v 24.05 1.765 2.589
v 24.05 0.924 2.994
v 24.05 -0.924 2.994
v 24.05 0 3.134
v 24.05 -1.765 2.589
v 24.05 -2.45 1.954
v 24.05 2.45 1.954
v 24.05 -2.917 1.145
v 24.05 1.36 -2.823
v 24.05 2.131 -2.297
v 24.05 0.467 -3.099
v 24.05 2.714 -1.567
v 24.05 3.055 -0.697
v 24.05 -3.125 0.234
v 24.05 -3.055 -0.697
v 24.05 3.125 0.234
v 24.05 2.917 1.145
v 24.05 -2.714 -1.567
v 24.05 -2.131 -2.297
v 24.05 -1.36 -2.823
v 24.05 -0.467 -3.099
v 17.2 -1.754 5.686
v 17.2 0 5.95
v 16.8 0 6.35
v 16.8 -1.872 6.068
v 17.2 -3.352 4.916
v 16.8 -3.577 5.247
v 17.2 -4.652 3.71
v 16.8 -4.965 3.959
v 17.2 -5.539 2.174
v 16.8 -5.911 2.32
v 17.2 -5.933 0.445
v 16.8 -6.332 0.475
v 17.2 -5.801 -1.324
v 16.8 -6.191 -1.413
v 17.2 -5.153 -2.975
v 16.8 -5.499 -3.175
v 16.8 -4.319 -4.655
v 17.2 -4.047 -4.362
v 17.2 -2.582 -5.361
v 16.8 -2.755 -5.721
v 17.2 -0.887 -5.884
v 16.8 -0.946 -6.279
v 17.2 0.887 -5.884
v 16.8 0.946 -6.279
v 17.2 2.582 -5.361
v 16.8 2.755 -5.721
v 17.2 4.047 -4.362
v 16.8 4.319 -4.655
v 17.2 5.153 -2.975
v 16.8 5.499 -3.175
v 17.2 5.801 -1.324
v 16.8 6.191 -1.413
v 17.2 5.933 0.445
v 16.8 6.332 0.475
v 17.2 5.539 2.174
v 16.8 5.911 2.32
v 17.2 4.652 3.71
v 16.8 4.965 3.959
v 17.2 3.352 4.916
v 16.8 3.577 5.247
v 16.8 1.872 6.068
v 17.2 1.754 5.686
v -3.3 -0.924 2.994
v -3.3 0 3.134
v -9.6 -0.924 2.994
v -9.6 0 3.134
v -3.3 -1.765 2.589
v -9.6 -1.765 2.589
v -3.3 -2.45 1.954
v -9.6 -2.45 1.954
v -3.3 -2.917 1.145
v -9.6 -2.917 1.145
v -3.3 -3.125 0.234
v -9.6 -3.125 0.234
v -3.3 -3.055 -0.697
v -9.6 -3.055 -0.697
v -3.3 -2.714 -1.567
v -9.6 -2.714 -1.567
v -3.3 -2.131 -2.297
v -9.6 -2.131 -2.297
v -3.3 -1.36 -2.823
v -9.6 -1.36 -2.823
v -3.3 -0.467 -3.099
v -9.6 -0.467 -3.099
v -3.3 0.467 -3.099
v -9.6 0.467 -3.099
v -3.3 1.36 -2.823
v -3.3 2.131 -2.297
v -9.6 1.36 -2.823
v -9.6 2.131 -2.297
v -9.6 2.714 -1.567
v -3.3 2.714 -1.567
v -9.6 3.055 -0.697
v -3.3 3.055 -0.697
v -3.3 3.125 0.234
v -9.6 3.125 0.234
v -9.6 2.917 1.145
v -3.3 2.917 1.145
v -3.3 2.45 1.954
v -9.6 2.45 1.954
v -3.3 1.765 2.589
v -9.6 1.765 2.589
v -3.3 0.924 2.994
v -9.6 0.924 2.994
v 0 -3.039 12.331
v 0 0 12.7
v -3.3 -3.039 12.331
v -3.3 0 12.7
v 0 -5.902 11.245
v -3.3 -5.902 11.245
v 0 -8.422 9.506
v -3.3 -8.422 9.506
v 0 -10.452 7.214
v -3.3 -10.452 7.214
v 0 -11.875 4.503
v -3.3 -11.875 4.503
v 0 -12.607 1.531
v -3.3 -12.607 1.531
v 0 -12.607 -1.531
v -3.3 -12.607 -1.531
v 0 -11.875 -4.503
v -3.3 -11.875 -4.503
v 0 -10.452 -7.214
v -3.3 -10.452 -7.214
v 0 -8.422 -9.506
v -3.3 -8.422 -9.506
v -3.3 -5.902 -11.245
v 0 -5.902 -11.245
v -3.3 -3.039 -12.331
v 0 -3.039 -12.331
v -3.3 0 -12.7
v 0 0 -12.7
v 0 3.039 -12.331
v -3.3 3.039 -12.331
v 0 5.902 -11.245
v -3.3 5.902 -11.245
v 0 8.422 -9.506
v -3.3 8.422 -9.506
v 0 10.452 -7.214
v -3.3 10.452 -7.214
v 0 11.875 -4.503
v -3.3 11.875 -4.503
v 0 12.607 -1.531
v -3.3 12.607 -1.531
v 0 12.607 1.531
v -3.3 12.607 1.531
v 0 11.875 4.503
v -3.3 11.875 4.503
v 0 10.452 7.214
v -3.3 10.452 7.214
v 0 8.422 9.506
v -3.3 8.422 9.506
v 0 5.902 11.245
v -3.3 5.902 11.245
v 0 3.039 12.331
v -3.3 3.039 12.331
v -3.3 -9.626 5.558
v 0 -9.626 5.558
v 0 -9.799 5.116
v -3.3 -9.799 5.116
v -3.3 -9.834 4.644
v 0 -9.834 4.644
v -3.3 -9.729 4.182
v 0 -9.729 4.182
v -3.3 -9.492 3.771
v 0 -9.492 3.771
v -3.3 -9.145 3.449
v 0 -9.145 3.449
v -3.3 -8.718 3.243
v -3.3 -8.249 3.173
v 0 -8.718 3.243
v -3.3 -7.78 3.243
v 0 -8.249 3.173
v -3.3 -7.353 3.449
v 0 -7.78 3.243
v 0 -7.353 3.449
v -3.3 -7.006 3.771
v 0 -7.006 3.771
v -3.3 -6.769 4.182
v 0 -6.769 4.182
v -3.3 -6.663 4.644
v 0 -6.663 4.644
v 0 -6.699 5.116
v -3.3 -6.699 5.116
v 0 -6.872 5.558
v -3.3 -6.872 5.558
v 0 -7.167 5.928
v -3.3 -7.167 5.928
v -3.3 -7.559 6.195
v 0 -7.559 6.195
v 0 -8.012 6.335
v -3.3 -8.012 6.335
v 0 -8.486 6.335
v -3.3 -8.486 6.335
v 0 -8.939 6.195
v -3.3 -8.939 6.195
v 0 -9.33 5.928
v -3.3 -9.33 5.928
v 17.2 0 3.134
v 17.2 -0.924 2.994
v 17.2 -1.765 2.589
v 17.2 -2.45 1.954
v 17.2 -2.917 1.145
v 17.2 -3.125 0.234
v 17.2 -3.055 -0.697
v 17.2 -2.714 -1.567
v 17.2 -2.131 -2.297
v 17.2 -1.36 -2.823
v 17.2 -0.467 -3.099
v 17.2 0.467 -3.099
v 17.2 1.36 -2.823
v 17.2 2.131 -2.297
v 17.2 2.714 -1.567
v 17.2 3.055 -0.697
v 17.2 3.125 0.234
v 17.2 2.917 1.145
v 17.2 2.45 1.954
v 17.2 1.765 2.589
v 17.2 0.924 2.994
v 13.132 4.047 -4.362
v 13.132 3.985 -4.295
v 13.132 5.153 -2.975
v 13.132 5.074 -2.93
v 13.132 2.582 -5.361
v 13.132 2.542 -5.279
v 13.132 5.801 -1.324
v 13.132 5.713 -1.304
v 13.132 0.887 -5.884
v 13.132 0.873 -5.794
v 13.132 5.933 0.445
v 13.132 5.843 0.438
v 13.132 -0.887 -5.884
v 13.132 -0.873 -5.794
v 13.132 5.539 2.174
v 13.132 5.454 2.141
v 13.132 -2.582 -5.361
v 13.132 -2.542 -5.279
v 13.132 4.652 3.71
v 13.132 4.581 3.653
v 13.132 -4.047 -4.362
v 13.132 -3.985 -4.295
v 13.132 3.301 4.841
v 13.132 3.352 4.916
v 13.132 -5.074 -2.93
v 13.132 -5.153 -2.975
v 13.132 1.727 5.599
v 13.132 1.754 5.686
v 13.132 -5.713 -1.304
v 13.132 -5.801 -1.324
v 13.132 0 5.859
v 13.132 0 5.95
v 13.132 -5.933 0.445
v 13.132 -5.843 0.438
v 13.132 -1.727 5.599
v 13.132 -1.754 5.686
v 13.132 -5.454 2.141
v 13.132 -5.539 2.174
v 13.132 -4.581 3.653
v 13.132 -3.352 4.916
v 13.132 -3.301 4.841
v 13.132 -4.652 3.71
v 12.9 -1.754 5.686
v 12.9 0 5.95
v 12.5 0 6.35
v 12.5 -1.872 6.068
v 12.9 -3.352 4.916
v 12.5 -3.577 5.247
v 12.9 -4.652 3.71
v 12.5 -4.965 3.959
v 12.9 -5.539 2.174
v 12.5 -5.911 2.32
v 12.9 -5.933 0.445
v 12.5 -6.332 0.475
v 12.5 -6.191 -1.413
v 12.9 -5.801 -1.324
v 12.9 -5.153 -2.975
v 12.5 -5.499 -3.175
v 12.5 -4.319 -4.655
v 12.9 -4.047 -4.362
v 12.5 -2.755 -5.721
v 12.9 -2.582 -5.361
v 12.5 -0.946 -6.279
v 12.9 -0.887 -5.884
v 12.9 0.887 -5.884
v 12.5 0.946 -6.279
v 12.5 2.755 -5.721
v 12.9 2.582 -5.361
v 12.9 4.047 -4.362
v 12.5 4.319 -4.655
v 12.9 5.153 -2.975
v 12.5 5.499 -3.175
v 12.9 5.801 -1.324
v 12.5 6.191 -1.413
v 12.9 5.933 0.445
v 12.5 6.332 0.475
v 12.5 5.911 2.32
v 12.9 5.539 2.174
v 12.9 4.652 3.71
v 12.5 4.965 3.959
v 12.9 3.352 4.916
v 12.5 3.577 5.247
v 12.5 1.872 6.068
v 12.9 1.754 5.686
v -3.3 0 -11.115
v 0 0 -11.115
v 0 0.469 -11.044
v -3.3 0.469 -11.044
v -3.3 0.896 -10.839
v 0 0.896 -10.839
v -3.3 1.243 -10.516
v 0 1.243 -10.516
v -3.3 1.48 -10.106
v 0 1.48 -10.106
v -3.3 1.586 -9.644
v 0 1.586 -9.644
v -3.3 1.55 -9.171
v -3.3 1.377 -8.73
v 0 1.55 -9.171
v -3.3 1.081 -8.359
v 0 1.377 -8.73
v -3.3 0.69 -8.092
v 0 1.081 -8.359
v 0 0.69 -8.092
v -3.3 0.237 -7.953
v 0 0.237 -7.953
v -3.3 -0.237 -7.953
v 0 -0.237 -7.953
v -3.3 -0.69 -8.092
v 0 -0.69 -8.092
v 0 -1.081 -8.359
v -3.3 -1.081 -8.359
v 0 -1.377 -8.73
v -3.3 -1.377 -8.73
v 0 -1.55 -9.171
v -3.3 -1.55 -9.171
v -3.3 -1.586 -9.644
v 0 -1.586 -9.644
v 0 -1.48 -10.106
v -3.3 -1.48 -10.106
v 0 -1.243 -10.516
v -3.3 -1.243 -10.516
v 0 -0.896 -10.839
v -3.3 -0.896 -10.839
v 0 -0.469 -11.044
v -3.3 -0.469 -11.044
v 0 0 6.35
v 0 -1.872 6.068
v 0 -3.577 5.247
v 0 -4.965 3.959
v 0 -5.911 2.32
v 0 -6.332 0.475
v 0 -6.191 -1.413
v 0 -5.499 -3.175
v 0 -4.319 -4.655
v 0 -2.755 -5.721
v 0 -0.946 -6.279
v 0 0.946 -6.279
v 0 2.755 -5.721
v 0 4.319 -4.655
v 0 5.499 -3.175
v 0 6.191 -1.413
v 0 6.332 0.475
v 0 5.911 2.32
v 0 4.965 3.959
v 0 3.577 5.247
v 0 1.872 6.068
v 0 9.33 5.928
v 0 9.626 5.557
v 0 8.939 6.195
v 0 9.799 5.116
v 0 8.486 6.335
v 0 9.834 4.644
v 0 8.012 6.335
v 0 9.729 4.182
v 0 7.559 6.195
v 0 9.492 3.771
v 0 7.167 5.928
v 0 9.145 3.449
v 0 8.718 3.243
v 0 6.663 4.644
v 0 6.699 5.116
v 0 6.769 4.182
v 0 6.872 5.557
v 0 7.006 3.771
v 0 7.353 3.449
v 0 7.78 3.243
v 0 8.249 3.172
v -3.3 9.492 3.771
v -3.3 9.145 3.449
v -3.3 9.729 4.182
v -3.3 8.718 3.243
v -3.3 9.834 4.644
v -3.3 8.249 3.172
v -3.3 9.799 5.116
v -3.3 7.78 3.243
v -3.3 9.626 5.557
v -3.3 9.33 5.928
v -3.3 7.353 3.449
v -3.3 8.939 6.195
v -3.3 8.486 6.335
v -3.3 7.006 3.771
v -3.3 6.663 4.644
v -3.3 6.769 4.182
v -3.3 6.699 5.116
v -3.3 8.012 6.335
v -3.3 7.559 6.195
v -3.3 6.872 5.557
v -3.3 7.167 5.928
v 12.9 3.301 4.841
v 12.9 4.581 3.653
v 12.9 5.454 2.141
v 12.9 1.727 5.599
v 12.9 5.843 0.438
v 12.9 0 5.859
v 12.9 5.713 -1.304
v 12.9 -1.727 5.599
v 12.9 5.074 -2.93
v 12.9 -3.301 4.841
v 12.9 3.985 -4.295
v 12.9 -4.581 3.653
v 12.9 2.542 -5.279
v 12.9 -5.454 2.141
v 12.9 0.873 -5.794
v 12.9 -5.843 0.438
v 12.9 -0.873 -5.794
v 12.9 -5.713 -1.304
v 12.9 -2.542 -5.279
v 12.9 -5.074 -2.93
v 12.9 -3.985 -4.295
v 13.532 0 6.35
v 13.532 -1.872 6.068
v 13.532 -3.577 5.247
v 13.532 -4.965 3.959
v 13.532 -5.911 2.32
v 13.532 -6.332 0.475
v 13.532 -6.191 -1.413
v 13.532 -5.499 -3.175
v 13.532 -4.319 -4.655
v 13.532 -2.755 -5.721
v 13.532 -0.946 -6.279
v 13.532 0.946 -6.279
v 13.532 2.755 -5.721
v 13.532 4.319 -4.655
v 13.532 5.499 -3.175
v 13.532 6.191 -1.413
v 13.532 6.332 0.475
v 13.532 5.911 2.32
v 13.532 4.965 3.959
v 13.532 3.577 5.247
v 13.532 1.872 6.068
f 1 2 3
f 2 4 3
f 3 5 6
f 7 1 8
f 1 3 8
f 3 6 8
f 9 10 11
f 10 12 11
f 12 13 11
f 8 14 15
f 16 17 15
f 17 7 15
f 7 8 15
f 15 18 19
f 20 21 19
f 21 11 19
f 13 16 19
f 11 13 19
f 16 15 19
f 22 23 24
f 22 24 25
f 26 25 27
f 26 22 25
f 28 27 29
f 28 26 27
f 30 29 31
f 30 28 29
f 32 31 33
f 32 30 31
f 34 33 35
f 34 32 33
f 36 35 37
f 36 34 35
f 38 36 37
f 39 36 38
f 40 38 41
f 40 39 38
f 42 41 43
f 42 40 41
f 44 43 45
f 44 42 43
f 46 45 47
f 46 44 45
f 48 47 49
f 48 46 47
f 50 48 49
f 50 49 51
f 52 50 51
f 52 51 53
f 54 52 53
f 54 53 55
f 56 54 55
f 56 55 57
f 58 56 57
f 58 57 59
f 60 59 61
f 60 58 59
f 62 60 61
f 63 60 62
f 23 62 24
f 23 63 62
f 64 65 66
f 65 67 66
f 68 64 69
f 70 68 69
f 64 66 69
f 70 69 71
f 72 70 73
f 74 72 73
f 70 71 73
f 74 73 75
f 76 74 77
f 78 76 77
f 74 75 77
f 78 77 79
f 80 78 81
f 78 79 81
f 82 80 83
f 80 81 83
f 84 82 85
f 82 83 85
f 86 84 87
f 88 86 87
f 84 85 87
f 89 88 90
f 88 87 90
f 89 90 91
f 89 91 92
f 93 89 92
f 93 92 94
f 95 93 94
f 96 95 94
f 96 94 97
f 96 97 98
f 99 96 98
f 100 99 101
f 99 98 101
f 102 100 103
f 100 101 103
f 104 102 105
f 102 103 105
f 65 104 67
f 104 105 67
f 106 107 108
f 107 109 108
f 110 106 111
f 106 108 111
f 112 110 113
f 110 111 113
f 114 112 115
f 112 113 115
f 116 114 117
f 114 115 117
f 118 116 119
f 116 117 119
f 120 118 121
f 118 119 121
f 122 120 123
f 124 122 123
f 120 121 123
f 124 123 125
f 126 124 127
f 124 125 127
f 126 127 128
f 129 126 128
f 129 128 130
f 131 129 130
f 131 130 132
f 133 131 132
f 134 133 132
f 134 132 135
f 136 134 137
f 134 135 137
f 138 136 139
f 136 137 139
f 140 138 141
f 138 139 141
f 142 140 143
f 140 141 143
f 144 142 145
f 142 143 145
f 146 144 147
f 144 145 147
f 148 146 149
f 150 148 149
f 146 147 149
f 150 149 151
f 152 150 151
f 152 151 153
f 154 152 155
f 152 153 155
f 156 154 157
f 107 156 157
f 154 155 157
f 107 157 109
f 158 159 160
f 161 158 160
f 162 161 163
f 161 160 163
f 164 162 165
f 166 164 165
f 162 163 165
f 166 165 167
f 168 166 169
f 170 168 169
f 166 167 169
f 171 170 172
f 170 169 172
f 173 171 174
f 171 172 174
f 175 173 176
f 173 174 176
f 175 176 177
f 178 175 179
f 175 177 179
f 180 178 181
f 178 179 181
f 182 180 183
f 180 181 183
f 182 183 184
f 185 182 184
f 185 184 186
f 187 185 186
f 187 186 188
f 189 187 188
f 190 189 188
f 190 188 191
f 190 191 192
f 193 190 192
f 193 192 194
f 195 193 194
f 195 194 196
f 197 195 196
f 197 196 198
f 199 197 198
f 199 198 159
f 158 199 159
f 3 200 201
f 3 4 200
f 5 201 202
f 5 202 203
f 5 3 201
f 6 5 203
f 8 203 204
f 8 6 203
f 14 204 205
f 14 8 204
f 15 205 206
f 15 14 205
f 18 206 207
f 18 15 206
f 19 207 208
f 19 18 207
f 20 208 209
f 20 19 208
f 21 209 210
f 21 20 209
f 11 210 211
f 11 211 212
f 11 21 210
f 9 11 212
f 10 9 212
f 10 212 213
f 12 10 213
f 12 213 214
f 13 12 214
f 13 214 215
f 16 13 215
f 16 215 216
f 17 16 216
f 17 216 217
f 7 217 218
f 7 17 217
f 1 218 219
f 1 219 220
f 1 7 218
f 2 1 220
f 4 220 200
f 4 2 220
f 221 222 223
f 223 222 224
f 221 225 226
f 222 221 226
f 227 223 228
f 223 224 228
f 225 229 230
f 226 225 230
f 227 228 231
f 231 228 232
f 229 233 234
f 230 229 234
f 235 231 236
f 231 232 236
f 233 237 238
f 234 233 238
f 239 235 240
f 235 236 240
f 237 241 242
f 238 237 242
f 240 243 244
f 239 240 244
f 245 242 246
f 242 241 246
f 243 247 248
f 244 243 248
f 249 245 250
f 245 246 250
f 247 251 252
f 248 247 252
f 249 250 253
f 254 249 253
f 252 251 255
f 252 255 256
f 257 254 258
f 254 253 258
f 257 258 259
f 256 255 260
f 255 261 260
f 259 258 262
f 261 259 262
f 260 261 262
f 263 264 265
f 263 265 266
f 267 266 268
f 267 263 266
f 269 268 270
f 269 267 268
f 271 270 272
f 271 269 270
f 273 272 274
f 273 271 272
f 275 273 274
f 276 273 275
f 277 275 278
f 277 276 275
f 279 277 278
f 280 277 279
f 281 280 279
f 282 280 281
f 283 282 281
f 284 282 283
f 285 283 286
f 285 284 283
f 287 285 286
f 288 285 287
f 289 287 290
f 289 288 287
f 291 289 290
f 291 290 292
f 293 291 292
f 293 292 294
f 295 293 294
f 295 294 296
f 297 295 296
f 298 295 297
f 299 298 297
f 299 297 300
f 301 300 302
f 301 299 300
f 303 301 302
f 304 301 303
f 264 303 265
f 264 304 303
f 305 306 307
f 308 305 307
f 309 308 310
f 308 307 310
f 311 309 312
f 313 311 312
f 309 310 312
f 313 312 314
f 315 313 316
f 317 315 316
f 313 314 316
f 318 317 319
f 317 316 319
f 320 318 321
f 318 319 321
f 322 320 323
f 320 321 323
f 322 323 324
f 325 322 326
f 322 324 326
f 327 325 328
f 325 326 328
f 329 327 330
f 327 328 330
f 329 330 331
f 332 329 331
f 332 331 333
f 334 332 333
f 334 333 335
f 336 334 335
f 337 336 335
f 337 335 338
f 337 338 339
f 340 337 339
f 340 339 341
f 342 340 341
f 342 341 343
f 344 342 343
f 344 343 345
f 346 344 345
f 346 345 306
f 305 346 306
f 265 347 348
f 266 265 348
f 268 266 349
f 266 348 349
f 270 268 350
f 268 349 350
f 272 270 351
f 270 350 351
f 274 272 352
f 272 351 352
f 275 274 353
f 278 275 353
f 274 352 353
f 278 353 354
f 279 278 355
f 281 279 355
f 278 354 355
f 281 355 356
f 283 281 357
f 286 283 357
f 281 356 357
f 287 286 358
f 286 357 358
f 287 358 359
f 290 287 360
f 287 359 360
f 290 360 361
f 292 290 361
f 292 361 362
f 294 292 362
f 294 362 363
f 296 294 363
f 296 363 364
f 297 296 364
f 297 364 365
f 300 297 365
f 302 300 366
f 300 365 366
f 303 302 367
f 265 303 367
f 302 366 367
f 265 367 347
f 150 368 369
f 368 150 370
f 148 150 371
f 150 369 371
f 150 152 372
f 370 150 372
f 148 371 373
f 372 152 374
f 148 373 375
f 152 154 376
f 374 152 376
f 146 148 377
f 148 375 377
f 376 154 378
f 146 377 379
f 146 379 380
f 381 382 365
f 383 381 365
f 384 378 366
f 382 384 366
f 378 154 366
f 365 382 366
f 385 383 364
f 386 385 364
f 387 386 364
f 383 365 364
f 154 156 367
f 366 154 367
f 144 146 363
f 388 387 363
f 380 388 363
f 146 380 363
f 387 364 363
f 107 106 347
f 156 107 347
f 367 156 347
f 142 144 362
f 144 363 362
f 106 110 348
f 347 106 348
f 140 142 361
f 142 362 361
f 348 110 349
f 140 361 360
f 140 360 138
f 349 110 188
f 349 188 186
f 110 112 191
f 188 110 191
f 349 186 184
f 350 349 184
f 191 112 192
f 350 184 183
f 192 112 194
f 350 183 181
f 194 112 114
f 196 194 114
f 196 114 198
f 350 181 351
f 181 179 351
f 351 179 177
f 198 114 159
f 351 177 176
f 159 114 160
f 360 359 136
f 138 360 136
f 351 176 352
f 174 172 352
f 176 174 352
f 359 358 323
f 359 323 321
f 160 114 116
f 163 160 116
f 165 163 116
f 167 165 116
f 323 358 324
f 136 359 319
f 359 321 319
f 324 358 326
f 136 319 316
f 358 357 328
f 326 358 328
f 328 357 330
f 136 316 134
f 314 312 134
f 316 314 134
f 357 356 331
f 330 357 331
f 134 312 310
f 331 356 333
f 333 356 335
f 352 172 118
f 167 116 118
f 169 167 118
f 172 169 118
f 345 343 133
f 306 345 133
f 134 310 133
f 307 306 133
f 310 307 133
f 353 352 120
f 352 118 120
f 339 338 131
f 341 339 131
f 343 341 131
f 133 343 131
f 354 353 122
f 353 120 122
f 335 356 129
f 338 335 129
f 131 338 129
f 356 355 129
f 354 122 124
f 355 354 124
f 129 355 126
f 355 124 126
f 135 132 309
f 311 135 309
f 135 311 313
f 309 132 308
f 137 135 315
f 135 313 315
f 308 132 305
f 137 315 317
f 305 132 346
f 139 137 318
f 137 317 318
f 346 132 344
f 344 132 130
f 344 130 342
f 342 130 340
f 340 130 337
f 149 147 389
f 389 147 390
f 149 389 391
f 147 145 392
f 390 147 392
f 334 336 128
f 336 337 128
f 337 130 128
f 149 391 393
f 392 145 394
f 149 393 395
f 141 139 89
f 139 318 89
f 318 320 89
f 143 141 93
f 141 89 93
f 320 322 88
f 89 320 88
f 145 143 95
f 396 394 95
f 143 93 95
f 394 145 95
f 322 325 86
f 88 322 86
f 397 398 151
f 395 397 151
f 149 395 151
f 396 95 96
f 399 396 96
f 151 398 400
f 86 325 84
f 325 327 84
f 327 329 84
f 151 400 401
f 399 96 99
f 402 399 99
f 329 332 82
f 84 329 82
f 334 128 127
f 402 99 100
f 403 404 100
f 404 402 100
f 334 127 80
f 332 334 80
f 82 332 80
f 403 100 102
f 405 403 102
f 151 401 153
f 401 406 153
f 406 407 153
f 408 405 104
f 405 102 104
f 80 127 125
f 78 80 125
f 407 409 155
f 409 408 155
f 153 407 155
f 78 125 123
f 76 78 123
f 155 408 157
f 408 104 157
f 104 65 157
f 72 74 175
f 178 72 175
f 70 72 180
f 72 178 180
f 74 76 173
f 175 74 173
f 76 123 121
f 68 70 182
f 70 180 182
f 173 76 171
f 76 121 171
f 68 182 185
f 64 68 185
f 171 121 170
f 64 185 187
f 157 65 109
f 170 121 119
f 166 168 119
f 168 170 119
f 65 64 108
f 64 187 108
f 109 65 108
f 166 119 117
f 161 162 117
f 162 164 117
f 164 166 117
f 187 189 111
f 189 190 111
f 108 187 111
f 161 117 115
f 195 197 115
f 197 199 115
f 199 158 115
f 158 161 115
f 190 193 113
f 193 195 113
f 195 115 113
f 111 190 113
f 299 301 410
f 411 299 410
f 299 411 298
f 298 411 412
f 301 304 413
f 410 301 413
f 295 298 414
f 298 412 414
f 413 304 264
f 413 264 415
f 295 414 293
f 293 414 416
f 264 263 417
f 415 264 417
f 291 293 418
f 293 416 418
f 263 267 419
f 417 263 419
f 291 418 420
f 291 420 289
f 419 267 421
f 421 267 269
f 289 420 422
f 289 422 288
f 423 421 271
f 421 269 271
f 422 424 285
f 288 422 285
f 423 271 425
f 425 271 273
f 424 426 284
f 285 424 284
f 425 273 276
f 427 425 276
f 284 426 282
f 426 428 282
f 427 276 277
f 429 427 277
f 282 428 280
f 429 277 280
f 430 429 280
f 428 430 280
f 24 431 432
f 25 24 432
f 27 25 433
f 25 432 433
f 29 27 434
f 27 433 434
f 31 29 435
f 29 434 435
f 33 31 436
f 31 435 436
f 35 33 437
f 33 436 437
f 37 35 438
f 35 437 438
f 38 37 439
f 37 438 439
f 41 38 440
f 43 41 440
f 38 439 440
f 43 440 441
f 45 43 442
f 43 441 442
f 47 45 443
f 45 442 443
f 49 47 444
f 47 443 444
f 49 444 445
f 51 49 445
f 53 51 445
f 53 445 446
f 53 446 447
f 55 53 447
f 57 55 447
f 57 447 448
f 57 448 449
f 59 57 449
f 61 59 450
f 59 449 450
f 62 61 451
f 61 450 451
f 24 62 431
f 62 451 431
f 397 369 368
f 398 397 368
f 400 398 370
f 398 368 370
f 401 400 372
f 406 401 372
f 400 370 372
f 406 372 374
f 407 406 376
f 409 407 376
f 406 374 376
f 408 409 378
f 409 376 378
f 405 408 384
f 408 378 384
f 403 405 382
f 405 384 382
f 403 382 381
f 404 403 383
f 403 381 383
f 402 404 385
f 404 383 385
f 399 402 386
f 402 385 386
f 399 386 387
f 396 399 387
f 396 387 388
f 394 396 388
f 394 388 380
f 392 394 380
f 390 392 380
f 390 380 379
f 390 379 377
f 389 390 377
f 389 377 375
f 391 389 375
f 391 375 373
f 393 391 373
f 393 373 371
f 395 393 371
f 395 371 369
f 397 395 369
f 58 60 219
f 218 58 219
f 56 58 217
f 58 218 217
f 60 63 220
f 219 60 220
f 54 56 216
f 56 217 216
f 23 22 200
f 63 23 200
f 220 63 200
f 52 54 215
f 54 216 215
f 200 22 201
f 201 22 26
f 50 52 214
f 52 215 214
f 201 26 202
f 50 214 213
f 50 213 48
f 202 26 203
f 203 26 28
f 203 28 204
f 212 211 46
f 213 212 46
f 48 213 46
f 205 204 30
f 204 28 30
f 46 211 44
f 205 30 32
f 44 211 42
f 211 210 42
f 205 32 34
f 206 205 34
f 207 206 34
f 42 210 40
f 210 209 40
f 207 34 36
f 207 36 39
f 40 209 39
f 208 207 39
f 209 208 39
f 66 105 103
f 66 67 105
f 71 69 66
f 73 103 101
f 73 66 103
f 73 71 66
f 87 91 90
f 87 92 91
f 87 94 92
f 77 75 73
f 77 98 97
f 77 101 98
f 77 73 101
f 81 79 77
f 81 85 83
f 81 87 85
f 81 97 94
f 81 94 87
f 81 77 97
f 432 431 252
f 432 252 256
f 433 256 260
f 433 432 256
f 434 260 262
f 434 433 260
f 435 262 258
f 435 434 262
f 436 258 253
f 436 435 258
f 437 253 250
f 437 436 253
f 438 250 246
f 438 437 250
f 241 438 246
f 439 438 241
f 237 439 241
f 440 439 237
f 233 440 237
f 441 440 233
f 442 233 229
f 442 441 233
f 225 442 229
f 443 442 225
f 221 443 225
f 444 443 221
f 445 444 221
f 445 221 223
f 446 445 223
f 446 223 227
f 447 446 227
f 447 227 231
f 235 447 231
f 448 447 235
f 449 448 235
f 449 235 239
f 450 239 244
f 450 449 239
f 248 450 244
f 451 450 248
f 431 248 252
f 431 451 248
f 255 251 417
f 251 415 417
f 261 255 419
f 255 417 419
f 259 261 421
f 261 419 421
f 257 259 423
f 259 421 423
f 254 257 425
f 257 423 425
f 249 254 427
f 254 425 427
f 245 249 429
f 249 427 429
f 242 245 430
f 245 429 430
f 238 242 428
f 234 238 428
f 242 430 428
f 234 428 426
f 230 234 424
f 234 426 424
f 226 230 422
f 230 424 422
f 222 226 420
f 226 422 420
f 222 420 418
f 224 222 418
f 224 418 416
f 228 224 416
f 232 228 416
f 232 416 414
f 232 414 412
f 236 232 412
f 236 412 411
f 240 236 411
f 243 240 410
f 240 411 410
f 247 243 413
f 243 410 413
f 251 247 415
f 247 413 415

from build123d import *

# Parameters (mm, degrees)
SKETCH1_W          = 6.3
SKETCH1_H          = 3.133597909
SKETCH1_W_2        = 20.5
SKETCH1_W_3        = 6.85
SKETCH2_R          = 1.59
CUT_EXTRUDE1_DEPTH = 10
CIRPATTERN1_COUNT  = 3
CHAMFER1_SIZE      = 0.4


with BuildPart() as part:
    # Sketch1 → Revolve1 (revolve)
    with BuildSketch(Plane.XY, mode=Mode.PRIVATE) as revolve1_sk:
        with Locations((-6.45, 1.566798955)):
            Rectangle(SKETCH1_W, SKETCH1_H)
        with Locations((6.95, 1.566798955)):
            Rectangle(SKETCH1_W_2, SKETCH1_H)
        Polygon((17.2, 3.133597909), (17.2, 6.35), (13.132231879, 6.35), (13.132231879, 5.859469346), (12.9, 5.859469346), (12.9, 6.35), (0, 6.35), (0, 12.7), (-3.3, 12.7), (-3.3, 3.133597909), align=None)
        with Locations((20.625, 1.566798955)):
            Rectangle(SKETCH1_W_3, SKETCH1_H)
    revolve(revolve1_sk.sketch.rotate(Axis((-3.3, 0, 0), (1, 0, 0)), 90), axis=Axis((-3.3, 0, 0), (1, 0, 0)))

    # Sketch2 → Cut-Extrude1 (cut)
    with BuildSketch(Plane(origin=(0, 0, 0), x_dir=(0, 0, -1), z_dir=(1, 0, 0))):
        with Locations((9.525, 0)):
            Circle(SKETCH2_R)
    cut_extrude1 = extrude(amount=-CUT_EXTRUDE1_DEPTH, mode=Mode.SUBTRACT)

    # CirPattern1: Cut-Extrude1 ×3 about axis
    cirpattern1_axis = Axis((0, 0, 0), (1, 0, 0))
    for i in range(1, CIRPATTERN1_COUNT):
        add(cut_extrude1.rotate(cirpattern1_axis, i * 360 / CIRPATTERN1_COUNT), mode=Mode.SUBTRACT)

    # Chamfer1
    chamfer1_edges = [part.edges().sort_by_distance(p)[0] for p in [
        (12.9, 0, -6.35),
        (13.132231879, 0, -6.35),
        (17.2, 0, -6.35),
    ]]
    chamfer(chamfer1_edges, length=CHAMFER1_SIZE)


solid = part.part
